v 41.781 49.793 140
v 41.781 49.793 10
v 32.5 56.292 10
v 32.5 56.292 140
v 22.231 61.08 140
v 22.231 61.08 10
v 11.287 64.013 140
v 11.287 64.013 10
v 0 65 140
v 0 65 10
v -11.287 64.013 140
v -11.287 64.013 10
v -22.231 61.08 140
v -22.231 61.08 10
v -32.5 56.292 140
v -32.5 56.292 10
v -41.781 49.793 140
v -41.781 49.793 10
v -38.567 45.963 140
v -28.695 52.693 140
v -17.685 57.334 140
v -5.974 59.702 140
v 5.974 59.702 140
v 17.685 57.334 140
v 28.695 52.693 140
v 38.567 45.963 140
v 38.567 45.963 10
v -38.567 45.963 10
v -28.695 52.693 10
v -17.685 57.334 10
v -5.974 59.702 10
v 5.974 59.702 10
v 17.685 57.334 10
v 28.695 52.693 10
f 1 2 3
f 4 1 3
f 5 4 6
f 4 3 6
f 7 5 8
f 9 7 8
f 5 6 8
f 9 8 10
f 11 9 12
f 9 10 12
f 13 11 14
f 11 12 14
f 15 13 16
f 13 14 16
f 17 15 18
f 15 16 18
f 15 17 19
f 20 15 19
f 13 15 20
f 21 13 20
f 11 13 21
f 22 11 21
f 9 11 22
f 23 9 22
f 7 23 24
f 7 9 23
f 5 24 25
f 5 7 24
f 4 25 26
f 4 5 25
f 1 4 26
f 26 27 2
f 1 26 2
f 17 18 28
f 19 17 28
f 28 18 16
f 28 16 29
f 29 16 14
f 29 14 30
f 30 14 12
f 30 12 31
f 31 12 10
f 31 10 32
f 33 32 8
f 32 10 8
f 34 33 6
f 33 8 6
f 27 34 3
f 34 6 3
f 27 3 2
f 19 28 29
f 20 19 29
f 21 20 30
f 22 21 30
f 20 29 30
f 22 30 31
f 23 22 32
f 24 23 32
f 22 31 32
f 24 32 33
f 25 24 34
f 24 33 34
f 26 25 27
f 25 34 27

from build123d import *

# Parameters (mm, degrees)
BOSS_EXTRUDE1_DEPTH = 10
BOSS_EXTRUDE2_DEPTH = 130
CUT_EXTRUDE1_DEPTH  = 130


with BuildPart() as part:
    # Sketch1 → Boss-Extrude1 (new, symmetric)
    with BuildSketch(Plane.XY):
        with BuildLine():
            Line((38.567256581, 45.962666587), (25.711504387, 30.641777725))
            ThreePointArc((25.711504387, 30.641777725), (0, 40), (-25.711504387, 30.641777725))
            Line((-25.711504387, 30.641777725), (-38.567256581, 45.962666587))
            ThreePointArc((-38.567256581, 45.962666587), (0, 60), (38.567256581, 45.962666587))
        make_face()
    extrude(amount=BOSS_EXTRUDE1_DEPTH, both=True)

    # Sketch4 → Cut-Extrude1 (cut)
    with BuildSketch(Plane.XY.offset(10)):
        with BuildLine():
            Line((-38.567256581, 45.962666587), (-25.711504387, 30.641777725))
            ThreePointArc((-25.711504387, 30.641777725), (0, 40), (25.711504387, 30.641777725))
            Line((25.711504387, 30.641777725), (38.567256581, 45.962666587))
            ThreePointArc((38.567256581, 45.962666587), (0, 60), (-38.567256581, 45.962666587))
        make_face()
    extrude(amount=-CUT_EXTRUDE1_DEPTH, mode=Mode.SUBTRACT)


with BuildPart() as body_2:
    # Sketch3 → Boss-Extrude2 (new body)
    with BuildSketch(Plane.XY.offset(10)):
        with BuildLine():
            Line((-41.78119463, 49.792888803), (-38.567256581, 45.962666587))
            ThreePointArc((-38.567256581, 45.962666587), (0, 60), (38.567256581, 45.962666587))
            Line((38.567256581, 45.962666587), (41.78119463, 49.792888803))
            ThreePointArc((41.78119463, 49.792888803), (0, 65), (-41.78119463, 49.792888803))
        make_face()
    extrude(amount=BOSS_EXTRUDE2_DEPTH)


solid = body_2.part
